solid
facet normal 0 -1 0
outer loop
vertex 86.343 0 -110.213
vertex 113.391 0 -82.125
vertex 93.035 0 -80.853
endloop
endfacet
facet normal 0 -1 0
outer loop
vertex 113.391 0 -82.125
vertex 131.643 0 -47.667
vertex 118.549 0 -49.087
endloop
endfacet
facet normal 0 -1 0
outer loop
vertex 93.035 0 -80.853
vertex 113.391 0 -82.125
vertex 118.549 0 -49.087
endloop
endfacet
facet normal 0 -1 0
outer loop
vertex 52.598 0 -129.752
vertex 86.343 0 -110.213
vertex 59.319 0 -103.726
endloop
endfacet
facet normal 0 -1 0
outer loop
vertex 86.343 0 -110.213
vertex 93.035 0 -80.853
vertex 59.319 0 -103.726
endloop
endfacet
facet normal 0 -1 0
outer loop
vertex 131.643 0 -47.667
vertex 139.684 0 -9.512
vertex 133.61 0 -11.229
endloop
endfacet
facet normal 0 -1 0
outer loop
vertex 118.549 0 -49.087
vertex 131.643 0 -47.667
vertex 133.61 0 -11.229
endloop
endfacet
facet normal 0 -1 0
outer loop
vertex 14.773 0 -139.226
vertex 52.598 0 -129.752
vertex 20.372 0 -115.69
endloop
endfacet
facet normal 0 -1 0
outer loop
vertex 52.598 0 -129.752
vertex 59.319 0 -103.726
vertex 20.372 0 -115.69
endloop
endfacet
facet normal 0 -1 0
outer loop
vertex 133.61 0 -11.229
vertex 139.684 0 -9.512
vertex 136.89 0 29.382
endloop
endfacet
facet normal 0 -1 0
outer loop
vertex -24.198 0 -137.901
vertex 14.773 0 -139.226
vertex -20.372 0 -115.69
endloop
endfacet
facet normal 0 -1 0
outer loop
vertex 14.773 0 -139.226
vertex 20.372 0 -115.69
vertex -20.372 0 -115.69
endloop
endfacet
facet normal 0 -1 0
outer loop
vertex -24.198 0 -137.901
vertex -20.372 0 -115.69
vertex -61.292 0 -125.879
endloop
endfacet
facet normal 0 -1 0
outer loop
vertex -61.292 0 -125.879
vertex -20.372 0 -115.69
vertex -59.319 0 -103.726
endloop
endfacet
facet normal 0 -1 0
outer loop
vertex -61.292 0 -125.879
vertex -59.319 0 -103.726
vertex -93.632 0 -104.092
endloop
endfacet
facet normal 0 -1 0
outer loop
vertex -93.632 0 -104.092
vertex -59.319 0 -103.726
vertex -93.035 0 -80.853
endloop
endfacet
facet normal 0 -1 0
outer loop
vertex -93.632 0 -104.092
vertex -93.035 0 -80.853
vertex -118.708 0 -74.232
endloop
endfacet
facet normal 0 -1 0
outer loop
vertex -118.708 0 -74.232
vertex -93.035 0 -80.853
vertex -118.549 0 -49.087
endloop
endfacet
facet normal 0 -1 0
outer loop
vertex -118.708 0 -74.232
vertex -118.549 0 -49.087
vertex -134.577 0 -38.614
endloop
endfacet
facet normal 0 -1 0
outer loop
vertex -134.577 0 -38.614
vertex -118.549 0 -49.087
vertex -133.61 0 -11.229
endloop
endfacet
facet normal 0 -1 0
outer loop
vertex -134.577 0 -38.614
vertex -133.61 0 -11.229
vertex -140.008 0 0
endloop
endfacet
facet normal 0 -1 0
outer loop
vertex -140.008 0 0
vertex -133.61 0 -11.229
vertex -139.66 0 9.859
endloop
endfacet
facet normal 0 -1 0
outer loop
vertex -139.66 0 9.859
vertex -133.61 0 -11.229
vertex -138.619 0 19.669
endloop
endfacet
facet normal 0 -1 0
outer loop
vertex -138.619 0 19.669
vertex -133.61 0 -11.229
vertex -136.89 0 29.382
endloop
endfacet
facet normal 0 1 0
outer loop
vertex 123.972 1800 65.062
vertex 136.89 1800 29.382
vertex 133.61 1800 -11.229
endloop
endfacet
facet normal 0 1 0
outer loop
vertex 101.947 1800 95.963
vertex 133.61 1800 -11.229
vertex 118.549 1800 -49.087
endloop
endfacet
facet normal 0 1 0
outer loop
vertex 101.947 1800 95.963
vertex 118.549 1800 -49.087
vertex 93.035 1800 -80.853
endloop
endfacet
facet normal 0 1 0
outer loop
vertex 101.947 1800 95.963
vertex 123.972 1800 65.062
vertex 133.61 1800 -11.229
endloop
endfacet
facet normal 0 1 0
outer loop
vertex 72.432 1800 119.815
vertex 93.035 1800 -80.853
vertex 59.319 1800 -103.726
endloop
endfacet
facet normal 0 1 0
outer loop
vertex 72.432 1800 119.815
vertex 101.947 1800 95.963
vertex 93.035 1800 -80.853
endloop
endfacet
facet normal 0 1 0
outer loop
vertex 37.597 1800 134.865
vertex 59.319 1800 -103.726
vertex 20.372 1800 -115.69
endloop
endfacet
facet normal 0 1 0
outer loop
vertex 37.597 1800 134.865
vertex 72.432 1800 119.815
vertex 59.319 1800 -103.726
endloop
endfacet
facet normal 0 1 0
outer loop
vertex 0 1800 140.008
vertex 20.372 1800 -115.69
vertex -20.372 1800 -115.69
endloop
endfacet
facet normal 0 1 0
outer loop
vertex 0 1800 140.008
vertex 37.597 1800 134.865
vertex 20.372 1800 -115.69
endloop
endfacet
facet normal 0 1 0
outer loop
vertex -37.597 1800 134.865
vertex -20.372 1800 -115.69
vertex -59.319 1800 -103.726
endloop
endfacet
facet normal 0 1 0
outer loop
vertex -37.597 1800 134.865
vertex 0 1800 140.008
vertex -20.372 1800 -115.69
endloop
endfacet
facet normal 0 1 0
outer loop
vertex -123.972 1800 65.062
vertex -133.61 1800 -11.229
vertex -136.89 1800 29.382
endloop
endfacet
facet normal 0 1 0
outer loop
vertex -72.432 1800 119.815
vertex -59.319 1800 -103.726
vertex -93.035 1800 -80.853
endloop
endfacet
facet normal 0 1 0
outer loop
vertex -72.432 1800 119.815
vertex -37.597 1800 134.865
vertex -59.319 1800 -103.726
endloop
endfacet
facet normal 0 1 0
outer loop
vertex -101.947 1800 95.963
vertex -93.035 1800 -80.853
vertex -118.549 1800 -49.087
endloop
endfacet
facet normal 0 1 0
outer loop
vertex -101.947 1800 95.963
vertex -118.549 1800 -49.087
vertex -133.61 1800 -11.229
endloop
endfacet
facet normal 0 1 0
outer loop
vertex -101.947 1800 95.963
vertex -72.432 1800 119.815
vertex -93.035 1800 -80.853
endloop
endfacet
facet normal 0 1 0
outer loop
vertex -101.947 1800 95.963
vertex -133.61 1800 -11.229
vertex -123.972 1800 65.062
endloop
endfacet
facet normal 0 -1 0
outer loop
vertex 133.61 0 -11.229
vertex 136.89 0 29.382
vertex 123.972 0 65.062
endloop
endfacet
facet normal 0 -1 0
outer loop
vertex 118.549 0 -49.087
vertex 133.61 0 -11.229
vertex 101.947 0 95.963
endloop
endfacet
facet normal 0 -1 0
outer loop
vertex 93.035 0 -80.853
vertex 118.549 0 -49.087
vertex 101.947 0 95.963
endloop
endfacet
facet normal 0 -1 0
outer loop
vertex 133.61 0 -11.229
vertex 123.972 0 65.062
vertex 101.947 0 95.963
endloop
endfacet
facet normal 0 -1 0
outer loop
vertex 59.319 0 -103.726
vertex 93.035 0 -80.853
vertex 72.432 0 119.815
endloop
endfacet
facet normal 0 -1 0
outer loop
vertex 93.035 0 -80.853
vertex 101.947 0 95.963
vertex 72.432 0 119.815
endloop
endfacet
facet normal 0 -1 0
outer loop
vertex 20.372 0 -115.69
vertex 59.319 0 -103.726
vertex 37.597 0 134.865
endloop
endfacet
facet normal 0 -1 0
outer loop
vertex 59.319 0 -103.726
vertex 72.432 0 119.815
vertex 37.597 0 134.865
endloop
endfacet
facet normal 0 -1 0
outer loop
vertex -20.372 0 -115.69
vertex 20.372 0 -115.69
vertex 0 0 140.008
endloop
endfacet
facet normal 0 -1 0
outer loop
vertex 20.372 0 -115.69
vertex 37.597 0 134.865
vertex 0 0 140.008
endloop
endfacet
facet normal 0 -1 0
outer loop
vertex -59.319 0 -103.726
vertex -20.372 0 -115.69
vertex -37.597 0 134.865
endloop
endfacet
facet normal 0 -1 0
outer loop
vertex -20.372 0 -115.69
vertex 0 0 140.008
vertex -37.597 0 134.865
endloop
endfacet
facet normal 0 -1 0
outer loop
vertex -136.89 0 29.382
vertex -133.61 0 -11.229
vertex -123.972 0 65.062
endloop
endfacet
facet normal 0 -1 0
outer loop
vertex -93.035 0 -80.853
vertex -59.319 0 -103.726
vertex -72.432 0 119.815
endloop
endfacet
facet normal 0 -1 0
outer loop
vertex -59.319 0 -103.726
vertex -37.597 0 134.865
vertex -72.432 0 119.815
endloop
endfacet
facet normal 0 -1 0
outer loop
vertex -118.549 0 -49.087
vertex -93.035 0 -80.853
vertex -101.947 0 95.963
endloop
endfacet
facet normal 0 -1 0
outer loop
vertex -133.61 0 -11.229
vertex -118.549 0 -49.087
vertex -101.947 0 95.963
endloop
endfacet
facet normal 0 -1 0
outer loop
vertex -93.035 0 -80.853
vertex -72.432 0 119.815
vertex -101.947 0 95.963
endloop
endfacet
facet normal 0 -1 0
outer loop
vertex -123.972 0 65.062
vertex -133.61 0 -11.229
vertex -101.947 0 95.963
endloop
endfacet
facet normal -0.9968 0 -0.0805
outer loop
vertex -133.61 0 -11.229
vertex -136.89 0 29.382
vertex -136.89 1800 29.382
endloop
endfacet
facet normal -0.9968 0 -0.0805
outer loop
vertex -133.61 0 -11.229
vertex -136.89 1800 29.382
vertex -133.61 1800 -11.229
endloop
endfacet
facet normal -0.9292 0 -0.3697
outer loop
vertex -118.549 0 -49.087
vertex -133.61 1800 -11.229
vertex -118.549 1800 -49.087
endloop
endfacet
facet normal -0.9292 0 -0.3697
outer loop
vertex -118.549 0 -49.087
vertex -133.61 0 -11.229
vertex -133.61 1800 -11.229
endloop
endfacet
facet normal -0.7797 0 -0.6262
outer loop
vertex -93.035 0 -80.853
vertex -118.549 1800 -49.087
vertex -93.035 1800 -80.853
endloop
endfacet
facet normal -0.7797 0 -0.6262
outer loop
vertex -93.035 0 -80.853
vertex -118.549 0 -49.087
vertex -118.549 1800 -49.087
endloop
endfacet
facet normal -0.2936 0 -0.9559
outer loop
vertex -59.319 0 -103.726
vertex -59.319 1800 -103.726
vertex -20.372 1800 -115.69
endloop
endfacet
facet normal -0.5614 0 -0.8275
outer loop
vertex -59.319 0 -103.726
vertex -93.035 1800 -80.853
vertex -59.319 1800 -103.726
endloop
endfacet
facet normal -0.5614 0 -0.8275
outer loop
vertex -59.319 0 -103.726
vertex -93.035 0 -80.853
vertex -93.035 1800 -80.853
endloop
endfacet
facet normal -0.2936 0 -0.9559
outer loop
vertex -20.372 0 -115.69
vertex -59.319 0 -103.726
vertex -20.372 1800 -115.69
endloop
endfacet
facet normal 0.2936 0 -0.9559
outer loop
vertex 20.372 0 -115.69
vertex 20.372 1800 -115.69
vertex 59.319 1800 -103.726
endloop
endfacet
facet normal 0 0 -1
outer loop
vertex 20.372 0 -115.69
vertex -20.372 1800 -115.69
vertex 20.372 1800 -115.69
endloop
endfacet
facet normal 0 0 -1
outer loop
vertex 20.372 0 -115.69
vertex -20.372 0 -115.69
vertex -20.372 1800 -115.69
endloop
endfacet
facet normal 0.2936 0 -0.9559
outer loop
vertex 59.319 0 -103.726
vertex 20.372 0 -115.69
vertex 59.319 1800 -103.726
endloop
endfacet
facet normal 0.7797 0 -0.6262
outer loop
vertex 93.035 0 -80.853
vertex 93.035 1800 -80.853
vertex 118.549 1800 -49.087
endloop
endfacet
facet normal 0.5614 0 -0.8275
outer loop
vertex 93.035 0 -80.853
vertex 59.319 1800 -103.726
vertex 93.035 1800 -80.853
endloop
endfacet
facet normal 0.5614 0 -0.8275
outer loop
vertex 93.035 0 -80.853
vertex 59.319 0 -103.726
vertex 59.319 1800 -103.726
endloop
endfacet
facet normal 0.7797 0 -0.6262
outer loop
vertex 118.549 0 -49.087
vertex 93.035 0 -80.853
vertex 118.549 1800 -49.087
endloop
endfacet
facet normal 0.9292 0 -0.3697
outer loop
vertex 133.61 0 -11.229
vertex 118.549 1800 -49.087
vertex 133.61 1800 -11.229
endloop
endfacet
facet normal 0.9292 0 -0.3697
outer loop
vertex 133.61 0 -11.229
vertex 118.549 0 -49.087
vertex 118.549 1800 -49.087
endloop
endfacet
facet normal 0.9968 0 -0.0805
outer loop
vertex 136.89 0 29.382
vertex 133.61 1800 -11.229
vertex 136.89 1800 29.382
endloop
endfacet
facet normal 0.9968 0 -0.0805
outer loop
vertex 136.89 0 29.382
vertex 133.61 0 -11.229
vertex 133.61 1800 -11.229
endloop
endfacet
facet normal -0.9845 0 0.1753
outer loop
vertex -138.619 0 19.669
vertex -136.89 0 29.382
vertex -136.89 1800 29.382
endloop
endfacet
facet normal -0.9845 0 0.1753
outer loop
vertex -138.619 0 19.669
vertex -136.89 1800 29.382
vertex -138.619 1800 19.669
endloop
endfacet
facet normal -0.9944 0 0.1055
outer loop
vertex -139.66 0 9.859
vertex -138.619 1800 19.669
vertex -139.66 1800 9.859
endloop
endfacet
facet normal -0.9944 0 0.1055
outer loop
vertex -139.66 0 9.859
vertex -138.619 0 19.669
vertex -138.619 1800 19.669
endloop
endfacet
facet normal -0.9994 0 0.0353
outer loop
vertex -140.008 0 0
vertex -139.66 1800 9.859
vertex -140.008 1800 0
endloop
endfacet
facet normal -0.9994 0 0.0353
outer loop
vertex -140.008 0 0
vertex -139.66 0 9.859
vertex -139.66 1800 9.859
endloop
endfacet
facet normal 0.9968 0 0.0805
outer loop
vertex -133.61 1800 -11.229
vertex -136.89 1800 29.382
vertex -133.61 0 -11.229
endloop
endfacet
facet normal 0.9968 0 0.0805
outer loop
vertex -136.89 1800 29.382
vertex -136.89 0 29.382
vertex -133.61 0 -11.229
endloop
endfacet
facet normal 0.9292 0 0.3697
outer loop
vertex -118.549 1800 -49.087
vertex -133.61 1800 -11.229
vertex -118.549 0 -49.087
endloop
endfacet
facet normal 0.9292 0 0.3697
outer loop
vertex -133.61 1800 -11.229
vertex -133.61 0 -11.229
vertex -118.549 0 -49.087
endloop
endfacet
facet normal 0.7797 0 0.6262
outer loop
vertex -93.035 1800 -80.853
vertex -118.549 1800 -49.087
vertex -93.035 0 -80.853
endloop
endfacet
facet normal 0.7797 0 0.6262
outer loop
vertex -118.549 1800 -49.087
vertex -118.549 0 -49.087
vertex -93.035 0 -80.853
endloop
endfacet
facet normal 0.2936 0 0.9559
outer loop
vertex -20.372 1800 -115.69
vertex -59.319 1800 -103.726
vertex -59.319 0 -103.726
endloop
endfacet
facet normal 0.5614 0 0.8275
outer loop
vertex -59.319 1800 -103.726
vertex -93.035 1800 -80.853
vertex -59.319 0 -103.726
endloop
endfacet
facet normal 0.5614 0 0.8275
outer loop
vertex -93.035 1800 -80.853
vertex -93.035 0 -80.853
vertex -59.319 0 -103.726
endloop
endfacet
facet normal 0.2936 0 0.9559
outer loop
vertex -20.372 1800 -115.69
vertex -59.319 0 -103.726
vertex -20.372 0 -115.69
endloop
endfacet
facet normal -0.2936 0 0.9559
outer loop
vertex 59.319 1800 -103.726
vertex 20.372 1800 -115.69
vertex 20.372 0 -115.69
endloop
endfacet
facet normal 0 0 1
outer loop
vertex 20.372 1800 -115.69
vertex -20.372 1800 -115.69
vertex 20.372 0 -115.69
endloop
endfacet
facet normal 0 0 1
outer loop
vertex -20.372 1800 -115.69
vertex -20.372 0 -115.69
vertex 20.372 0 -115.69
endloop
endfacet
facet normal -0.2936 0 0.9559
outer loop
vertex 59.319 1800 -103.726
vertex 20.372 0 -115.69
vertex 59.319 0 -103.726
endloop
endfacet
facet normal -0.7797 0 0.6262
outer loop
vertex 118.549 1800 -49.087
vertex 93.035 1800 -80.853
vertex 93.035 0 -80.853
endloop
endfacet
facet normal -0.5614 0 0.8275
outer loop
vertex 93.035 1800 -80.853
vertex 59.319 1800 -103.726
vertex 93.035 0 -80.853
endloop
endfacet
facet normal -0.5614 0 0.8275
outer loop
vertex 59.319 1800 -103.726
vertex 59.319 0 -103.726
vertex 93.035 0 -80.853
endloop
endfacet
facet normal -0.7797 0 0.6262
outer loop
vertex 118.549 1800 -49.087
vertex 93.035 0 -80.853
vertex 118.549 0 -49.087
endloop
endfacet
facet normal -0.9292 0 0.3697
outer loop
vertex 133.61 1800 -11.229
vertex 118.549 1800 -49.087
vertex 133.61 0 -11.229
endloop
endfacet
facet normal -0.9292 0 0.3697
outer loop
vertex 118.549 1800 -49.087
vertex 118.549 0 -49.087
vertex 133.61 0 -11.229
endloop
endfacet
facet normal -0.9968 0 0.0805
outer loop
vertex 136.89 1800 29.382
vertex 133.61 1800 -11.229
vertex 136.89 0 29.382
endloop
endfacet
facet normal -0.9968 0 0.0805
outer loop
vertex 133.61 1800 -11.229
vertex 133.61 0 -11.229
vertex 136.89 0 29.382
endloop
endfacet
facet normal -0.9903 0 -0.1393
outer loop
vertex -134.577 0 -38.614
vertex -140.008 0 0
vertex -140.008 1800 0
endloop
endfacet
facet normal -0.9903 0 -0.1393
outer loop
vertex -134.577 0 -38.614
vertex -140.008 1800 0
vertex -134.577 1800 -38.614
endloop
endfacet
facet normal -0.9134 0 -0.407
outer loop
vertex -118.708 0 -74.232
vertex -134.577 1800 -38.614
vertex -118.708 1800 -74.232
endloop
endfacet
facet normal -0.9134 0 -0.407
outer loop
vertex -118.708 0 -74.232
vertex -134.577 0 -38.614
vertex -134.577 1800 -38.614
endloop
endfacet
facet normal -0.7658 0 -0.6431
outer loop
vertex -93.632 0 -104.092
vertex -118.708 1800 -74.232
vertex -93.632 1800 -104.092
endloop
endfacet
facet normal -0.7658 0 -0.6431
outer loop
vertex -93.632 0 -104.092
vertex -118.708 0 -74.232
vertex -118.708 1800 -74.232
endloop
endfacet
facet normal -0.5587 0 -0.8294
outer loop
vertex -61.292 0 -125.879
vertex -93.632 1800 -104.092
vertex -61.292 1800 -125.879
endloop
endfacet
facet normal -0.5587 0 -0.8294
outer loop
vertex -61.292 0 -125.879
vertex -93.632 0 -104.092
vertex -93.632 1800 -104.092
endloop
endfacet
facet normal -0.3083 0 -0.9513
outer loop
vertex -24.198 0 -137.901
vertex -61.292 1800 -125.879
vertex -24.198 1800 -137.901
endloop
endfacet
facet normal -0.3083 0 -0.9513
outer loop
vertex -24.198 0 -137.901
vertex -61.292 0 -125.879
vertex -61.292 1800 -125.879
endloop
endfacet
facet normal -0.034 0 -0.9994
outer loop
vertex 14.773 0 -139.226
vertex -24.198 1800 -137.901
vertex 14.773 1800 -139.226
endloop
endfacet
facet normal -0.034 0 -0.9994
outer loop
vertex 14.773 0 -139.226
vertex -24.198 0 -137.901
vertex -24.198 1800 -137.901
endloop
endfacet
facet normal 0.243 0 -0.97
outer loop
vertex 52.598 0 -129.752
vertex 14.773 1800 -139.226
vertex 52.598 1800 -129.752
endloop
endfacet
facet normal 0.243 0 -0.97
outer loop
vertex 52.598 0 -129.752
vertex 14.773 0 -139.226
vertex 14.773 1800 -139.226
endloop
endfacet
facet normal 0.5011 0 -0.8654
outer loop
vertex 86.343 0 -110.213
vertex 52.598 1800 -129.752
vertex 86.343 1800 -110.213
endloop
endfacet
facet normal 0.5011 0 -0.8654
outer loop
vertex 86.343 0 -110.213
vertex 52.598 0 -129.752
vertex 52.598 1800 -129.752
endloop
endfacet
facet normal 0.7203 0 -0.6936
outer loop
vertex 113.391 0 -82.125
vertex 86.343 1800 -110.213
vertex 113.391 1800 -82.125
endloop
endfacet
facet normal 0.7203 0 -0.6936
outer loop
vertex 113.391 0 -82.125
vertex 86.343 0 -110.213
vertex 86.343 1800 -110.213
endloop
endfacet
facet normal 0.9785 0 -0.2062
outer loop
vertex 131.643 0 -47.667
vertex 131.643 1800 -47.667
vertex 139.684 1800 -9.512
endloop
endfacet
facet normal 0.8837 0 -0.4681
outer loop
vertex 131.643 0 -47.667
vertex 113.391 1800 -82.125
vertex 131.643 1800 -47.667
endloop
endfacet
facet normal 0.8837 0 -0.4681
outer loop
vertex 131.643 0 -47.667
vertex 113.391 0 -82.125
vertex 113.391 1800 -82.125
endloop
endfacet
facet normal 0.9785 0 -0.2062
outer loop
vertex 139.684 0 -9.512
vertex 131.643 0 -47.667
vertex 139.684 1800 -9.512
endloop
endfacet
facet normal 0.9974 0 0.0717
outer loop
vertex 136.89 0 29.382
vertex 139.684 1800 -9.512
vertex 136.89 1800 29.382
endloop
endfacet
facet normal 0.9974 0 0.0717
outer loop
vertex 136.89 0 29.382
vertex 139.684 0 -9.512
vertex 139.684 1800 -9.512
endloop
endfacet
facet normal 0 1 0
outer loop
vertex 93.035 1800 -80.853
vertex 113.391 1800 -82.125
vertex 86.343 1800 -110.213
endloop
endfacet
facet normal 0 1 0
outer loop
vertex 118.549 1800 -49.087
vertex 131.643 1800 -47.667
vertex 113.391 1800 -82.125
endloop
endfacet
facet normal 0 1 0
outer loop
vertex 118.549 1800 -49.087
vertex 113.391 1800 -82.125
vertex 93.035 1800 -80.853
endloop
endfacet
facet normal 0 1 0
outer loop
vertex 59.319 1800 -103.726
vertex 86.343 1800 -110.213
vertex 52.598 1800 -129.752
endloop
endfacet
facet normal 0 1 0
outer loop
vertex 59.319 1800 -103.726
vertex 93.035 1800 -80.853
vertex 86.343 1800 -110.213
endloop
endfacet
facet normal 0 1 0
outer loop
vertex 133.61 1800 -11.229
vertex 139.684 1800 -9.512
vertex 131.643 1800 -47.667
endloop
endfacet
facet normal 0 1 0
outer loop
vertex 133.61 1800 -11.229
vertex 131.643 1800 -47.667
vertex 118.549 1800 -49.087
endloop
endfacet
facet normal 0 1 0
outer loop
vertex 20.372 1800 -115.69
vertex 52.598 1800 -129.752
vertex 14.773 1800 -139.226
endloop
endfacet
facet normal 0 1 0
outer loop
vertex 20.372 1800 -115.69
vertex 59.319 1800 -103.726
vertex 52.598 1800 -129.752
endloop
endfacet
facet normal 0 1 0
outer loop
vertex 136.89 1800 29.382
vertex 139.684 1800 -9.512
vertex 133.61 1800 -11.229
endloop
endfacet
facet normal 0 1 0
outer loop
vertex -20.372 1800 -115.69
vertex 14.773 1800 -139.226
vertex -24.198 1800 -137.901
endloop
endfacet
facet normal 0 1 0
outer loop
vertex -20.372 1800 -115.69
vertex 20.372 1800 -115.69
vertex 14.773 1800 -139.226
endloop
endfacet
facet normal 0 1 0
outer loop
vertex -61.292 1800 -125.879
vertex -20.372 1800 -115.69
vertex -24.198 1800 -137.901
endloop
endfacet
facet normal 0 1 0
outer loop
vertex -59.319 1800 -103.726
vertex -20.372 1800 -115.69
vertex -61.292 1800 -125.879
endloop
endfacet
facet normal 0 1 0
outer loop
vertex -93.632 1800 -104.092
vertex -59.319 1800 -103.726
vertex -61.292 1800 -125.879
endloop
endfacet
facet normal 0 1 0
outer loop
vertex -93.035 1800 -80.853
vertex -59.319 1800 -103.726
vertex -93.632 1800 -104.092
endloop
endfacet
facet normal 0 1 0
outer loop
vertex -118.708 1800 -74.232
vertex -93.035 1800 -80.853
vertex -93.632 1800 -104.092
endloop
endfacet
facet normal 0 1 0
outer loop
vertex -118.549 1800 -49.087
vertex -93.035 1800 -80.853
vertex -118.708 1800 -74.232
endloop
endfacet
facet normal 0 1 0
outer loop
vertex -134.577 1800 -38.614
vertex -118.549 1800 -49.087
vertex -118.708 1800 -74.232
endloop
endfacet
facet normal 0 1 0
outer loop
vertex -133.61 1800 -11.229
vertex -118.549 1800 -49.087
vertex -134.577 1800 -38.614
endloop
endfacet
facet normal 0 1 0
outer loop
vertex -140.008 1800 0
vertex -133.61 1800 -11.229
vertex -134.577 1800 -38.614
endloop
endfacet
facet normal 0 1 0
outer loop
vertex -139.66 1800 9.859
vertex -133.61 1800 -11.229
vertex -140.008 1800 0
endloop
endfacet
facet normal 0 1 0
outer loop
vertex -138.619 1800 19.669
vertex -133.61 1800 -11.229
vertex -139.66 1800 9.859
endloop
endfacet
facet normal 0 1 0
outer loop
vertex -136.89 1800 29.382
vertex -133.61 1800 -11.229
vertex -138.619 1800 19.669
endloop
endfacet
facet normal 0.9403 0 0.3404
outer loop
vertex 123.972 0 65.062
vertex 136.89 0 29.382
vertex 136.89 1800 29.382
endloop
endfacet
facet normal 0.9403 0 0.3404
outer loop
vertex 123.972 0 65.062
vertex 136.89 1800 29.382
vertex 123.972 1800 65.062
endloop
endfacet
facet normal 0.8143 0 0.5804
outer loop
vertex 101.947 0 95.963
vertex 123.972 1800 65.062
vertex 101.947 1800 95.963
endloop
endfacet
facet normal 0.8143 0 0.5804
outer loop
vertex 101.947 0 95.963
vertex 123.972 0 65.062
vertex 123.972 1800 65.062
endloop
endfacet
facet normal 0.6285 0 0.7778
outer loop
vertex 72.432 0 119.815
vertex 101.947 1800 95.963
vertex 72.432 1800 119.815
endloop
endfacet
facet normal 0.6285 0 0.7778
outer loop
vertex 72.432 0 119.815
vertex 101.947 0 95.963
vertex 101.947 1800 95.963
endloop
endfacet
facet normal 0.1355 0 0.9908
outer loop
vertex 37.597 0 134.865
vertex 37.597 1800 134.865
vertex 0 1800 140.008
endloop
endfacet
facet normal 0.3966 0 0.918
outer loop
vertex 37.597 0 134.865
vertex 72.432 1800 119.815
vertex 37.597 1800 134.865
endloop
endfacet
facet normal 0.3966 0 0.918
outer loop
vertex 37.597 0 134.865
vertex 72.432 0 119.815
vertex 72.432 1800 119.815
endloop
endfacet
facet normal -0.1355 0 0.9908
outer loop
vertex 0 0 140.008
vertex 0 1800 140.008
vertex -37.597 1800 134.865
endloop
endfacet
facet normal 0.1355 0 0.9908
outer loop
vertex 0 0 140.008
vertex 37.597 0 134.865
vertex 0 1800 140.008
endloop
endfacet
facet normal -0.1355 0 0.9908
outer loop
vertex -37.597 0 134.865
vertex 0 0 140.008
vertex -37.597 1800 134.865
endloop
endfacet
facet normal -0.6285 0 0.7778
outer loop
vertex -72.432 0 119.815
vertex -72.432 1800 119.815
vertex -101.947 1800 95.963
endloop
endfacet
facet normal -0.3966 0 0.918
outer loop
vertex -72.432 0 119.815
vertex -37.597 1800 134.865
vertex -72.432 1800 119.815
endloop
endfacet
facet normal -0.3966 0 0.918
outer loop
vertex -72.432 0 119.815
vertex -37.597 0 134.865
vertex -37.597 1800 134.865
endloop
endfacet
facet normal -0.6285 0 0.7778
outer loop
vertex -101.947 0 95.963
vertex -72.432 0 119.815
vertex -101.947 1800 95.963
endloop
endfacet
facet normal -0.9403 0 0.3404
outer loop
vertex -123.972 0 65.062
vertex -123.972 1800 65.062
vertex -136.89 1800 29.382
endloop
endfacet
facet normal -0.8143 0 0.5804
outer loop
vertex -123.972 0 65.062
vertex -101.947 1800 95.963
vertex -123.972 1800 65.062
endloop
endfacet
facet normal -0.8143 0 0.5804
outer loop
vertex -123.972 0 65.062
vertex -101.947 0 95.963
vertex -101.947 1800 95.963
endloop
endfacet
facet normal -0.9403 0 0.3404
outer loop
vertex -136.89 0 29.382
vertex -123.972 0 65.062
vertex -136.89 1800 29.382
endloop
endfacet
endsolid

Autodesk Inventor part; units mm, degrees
ref_plane "YZ Plane" through (0, 0, 0) normal (1, 0, 0) x (0, 1, 0)
ref_plane "XZ Plane" through (0, 0, 0) normal (0, 1, 0) x (-1, 0, 0)
ref_plane "XY Plane" through (0, 0, 0) normal (0, 0, 1) x (1, 0, 0)
sketch "Sketch1" plane through (0, 0, 0) normal (0, 1, 0) x (-1, 0, 0)
  circle A0 centre (0, 0) radius 140.0075
  arc A1 (-136.8898, 29.3816) -> (136.8898, 29.3816) centre (0, 20) ccw
  dimension "d0" = 280.015
  dimension "d1" = 20
  dimension "d4" = 137.2109
extrude "Extrusion1" add sketch "Sketch1" along normal blind 1800 contours A1 A0 picked at (0, 54.1051)
sketch "Sketch2" plane through (0, 1800, 0) normal (0, 1, 0) x (1, 0, 0)
  point P0 (0, 0)
extrude "Extrusion2" add sketch "Sketch1" along normal blind 1800 separate body contours A0 A1 picked at (8.5009, -124.3896)
properties part number "control drum"
